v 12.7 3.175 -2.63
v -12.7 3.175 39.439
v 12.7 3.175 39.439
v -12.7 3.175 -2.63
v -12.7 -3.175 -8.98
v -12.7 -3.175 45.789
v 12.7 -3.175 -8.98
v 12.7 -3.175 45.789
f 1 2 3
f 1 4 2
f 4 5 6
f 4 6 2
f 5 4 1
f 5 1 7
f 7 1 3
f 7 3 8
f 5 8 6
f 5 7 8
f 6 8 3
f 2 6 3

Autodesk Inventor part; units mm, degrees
ref_plane "Start plane" through (0, 0, -8.9803) normal (0, 0, 1) x (1, 0, 0)
ref_plane "End plane" through (0, 0, 45.7894) normal (0, 0, 1) x (1, 0, 0)
sketch "Sketch" plane through (0, 0, 0) normal (0, 0, 1) x (1, 0, 0)
  line L0 (12.7, -3.175) -> (-12.7, -3.175)
  line L1 (-12.7, -3.175) -> (-12.7, 3.175)
  line L2 (-12.7, 3.175) -> (12.7, 3.175)
  line L3 (12.7, 3.175) -> (12.7, -3.175)
  line L4 (-6, 0) -> (8, 0) construction
  line L5 (0, -30) -> (0, 40) construction
  line L6 (0, 54) -> (0, -44) construction
  line L7 (-17.78, 0) -> (17.78, 0) construction
  dimension "d0" = 6.35
  dimension "d1" = 25.4
  dimension "d4" = 12.7
  dimension "d5" = 3.175
extrude "Body" add sketch "Sketch" along normal up to surface (54.7697 mm away) from surface at -8.9803
sketch "Sketch3" plane through (0, 0, 0) normal (0, 0, 1) x (1, 0, 0)
  line L0 (0, 0) -> (10, 0)
ref_plane "Work Plane3" through (0, 0, 0) normal (0, -1, 0) x (1, 0, 0)
sketch "Sketch4" plane through (0, 0, 0) normal (0, -1, 0) x (1, 0, 0)
  line L0 (-2, -8.9803) -> (12, -8.9803)
  line L1 (-2, 45.7894) -> (12, 45.7894)
  dimension "d9" = 54.7697
ref_plane "Work Plane4" through (0, -70.5269, -76.3322) normal (0, 0.7071, -0.7071) x (1, 0, 0)
split "Split1" plane through (0, -70.5269, -76.3322) removes the side toward (0, 0.7071, -0.7071)
ref_plane "Work Plane5" through (0, 5.3513, 37.2631) normal (0, 0.7071, 0.7071) x (1, 0, 0)
split "Split2" plane through (0, 5.3513, 37.2631) removes the side toward (0, 0.7071, 0.7071)
equation "\"d0\" = G_W"
equation "\"d1\" = G_H"
equation "\"d4\" = 0.5 * d1"
equation "\"d5\" = 0.5 * d0"
equation "\"d2\" = G_L"
equation "\"G_W\" = 6.35"
equation "\"G_H\" = 25.4"
equation "\"G_L\" = d9"
equation "\"G_OFFSET_START\" = 8.98026"
equation "\"G_OFFSET_END\" = 17.05259"
equation "\"d6\" = -G_OFFSET_START"
equation "\"d7\" = G_OFFSET_END + B_L"
equation "\"B_L\" = 28.73682"
properties part number "AISC - 1/4x1 - 2.156" material "Steel, Mild"
